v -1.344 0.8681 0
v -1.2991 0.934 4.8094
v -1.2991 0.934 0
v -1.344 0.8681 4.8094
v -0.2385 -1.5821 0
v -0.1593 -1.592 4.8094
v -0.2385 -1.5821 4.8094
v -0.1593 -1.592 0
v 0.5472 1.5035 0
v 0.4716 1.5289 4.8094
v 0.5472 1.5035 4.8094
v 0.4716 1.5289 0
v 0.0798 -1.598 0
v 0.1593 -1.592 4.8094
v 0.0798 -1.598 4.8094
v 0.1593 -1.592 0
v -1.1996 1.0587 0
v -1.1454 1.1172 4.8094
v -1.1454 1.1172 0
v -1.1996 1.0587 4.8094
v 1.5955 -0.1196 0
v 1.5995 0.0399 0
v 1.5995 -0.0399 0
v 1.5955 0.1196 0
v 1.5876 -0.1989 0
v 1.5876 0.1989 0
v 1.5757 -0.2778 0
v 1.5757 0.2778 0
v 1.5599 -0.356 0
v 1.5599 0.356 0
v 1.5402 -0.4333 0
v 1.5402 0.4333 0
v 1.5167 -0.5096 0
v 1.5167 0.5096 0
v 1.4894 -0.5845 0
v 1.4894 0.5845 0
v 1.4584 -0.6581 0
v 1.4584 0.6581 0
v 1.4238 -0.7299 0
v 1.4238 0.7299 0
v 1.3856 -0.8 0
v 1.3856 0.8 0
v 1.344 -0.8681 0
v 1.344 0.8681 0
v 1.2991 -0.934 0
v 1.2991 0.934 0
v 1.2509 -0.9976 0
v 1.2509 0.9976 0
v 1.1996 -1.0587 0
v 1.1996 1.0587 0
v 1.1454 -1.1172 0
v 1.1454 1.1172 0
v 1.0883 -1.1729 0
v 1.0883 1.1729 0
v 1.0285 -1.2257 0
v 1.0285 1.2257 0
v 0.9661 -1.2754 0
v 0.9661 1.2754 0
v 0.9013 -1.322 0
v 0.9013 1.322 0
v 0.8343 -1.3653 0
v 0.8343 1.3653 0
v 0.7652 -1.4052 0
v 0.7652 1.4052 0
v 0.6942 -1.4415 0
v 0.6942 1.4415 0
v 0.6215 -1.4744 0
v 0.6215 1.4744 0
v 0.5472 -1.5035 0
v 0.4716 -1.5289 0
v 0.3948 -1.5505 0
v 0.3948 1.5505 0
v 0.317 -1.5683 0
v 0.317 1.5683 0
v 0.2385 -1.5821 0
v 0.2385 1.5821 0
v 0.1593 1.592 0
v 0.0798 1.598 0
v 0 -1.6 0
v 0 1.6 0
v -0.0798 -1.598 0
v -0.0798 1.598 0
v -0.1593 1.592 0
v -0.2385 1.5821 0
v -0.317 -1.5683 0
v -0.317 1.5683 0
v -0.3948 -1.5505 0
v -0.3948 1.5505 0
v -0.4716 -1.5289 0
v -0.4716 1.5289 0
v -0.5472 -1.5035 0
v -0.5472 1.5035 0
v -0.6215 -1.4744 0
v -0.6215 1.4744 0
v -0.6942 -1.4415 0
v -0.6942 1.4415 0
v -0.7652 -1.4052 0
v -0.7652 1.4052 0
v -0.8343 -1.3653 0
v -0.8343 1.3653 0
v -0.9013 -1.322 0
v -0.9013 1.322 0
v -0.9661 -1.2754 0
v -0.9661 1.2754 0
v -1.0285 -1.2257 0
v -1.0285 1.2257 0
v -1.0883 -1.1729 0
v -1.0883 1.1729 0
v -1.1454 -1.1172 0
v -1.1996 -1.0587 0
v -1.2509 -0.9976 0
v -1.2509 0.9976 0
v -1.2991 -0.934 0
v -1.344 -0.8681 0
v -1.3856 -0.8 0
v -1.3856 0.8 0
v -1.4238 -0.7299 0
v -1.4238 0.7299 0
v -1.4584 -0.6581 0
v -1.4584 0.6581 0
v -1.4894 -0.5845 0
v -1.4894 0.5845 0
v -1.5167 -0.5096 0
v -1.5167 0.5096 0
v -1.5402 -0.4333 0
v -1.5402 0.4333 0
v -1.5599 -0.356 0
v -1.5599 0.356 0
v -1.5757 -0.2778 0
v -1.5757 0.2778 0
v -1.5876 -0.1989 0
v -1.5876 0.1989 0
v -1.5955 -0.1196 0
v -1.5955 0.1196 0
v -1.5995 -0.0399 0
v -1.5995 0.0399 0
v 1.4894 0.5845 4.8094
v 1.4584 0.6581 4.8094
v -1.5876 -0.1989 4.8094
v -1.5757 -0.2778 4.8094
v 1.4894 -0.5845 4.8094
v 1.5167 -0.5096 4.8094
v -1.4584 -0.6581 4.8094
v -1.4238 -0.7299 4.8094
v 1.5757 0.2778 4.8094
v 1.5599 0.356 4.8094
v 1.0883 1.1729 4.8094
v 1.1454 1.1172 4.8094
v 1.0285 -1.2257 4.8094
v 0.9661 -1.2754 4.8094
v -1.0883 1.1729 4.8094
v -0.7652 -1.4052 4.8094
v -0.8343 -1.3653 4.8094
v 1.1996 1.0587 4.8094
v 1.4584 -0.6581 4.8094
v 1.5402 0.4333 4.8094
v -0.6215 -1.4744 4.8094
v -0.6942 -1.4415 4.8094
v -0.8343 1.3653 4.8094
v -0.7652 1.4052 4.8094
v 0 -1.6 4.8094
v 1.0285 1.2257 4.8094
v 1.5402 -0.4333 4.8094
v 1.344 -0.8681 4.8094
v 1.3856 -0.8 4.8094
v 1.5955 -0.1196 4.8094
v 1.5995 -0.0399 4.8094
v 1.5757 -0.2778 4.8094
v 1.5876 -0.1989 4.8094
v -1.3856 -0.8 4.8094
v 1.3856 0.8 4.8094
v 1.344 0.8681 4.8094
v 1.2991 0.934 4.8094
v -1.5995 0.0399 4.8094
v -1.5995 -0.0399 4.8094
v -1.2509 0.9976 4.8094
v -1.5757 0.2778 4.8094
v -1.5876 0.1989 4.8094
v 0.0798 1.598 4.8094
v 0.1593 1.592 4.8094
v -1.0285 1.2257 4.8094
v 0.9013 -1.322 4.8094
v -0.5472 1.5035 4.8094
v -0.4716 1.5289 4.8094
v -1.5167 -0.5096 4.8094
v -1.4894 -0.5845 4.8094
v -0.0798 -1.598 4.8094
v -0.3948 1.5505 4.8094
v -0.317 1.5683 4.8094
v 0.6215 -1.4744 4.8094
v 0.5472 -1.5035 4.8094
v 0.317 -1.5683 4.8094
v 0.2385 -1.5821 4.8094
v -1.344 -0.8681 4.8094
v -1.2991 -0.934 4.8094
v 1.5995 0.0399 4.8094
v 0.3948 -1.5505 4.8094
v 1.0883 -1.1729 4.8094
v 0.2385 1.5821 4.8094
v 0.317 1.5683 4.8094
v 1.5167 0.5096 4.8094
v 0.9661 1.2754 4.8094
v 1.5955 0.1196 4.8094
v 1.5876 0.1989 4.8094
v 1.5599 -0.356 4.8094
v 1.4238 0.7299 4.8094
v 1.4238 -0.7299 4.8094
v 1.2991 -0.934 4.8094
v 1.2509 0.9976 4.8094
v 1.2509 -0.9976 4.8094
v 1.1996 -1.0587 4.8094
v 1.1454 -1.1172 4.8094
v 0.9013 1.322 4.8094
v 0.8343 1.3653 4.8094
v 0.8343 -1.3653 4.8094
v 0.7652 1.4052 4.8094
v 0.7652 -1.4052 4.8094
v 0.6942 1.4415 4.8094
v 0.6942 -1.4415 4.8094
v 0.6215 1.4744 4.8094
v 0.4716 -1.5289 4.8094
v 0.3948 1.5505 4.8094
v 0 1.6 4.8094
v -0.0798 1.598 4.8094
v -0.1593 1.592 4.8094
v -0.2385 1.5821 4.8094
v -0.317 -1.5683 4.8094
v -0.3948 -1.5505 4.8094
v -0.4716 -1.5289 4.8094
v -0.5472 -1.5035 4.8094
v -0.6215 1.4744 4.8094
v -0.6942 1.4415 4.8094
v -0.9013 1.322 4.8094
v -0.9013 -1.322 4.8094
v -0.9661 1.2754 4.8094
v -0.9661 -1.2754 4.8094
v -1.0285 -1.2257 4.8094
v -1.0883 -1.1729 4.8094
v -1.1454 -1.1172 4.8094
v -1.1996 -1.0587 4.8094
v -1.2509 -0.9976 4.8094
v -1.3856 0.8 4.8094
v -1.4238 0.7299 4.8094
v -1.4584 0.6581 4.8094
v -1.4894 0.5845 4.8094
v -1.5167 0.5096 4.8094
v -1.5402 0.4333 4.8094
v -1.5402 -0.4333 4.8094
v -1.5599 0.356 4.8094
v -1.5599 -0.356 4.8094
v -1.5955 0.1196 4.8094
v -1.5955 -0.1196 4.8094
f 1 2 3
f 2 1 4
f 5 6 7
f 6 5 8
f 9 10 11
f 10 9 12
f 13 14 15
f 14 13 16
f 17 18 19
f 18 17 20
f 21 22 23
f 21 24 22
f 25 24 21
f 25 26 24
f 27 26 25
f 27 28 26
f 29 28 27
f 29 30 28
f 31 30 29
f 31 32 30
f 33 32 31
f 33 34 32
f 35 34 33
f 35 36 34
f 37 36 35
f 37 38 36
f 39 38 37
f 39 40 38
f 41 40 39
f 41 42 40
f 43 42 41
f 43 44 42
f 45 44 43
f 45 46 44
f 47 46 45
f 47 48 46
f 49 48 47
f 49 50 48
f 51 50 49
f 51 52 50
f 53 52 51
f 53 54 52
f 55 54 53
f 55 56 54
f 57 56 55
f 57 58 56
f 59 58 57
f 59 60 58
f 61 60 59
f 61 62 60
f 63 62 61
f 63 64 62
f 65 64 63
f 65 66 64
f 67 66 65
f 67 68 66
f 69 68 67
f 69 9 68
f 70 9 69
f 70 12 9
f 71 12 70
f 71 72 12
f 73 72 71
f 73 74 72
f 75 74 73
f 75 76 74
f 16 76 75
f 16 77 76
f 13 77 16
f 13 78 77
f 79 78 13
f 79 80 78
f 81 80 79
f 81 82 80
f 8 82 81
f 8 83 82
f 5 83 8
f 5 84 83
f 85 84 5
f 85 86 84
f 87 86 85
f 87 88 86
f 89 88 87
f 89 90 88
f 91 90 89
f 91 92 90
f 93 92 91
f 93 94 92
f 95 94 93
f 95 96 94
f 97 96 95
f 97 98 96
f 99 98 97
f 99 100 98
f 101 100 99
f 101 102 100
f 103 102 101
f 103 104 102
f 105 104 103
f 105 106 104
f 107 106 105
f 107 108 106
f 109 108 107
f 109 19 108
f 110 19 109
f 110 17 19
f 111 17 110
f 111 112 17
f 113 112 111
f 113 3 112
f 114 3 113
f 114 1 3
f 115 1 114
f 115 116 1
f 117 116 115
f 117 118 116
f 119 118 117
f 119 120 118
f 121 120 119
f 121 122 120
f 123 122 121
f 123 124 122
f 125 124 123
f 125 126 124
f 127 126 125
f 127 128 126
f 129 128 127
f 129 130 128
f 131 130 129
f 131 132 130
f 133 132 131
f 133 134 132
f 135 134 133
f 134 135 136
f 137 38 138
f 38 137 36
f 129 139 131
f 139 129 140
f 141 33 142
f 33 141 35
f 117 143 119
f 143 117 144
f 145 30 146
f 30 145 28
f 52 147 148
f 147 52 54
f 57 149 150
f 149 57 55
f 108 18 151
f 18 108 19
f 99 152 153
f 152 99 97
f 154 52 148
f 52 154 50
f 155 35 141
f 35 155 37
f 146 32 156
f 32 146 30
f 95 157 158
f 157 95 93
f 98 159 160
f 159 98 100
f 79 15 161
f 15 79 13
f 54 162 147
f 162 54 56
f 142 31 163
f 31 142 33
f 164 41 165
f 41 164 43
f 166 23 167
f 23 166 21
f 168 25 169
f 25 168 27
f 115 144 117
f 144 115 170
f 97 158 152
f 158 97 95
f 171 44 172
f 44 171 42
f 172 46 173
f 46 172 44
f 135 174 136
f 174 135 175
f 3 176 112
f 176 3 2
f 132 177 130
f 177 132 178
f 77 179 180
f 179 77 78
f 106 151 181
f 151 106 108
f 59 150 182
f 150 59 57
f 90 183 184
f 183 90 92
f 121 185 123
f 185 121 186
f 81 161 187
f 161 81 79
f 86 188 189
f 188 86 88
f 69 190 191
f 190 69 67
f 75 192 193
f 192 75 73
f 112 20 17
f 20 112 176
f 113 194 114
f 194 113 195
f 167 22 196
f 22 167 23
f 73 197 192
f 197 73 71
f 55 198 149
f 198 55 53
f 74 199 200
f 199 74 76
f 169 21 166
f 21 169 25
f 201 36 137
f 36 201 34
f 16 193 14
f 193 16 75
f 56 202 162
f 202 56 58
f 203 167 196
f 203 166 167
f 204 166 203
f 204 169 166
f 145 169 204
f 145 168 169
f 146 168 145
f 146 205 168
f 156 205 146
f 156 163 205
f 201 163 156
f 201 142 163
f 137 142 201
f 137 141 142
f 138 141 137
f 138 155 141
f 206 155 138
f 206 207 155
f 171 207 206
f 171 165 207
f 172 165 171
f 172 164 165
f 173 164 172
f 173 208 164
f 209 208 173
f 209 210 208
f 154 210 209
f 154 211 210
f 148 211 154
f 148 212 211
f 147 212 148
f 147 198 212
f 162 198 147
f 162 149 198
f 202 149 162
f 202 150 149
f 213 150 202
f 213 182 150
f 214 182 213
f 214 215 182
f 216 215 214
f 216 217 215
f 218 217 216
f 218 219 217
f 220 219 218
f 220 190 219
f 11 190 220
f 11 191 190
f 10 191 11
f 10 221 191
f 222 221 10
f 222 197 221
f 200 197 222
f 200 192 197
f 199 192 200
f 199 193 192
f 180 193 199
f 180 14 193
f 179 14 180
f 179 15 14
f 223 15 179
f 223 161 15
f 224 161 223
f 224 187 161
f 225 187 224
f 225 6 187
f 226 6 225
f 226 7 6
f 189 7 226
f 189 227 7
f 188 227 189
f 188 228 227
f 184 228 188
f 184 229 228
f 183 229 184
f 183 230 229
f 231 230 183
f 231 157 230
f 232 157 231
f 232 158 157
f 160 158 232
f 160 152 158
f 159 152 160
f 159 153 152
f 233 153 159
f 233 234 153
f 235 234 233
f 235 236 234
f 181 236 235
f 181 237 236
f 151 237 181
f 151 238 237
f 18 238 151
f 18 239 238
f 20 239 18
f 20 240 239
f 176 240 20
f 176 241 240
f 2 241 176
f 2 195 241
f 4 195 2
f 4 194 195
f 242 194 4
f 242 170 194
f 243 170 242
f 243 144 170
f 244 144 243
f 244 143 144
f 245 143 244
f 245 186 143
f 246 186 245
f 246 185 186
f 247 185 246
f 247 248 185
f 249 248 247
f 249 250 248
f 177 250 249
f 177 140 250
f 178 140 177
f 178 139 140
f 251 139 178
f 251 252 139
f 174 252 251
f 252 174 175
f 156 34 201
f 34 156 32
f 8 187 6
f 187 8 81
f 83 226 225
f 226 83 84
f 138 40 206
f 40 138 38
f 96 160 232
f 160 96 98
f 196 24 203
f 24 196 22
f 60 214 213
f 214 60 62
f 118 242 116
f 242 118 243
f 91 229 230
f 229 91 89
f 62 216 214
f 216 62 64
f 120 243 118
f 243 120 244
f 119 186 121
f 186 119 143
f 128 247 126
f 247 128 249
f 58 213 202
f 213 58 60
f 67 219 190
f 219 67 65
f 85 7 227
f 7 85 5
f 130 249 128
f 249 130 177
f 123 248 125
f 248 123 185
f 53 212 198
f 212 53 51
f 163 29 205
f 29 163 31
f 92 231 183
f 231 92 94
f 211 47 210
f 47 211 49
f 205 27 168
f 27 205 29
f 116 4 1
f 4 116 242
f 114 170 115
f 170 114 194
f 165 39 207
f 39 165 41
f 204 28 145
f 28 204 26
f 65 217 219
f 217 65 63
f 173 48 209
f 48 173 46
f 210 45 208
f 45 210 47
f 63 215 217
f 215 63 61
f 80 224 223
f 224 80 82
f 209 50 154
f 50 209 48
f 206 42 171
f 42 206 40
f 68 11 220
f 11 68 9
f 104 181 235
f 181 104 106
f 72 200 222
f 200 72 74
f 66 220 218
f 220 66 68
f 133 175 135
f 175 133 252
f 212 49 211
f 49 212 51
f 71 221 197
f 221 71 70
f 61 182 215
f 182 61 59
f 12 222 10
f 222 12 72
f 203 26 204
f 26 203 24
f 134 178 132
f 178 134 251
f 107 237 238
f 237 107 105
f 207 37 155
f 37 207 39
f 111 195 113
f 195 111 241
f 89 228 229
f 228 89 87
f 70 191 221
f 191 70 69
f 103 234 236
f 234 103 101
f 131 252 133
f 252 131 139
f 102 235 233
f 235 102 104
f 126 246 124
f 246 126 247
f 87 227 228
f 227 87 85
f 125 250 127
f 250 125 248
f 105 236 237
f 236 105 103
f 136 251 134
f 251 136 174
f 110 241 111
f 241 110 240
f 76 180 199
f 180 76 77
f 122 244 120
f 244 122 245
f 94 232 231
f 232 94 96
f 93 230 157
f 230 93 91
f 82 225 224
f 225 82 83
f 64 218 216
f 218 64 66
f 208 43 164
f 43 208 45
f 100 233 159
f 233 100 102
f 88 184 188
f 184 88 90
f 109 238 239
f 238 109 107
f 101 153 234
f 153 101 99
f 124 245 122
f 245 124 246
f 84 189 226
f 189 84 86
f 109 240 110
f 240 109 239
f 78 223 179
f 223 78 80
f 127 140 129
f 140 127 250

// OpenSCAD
// file: ../p/stud.scad
use <../lib.scad>
use <4-4cyli.scad>
use <4-4disc.scad>
use <4-4edge.scad>
$fa=1; $fs=0.2;
function ldraw_lib__stud(realsolid=false) = realsolid ? 
    [openscad(translate([0,0,-eps()], o=cylinder(4+eps(), r=6)),2)] : [
// 0 Stud
// 0 Name: stud.dat
// 0 Author: James Jessiman
// 0 !LDRAW_ORG Primitive UPDATE 2012-01
// 0 !LICENSE Licensed under CC BY 2.0 and CC BY 4.0 : see CAreadme.txt
// 
// 0 BFC CERTIFY CCW
  [0,"BFC","CERTIFY"],
  [0,"BFC","CCW"],
// 
// 0 !HISTORY 2002-04-04 [sbliss] Modified for BFC compliance
// 0 !HISTORY 2002-04-25 [PTadmin] Official Update 2002-02
// 0 !HISTORY 2007-06-24 [PTadmin] Header formatted for Contributor Agreement
// 0 !HISTORY 2008-07-01 [PTadmin] Official Update 2008-01
// 0 !HISTORY 2012-02-16 [Philo] Changed to CCW
// 0 !HISTORY 2012-03-30 [PTadmin] Official Update 2012-01
// 
// 
// 1 16 0 0 0 6 0 0 0 1 0 0 0 6 4-4edge.dat
  [1,16,0,0,0,6,0,0,0,1,0,0,0,6, ldraw_lib__4_4edge(realsolid)],
// 1 16 0 -4 0 6 0 0 0 1 0 0 0 6 4-4edge.dat
  [1,16,0,-4,0,6,0,0,0,1,0,0,0,6, ldraw_lib__4_4edge(realsolid)],
// 1 16 0 0 0 6 0 0 0 -4 0 0 0 6 4-4cyli.dat
  [1,16,0,0,0,6,0,0,0,-4,0,0,0,6, ldraw_lib__4_4cyli(realsolid)],
// 1 16 0 -4 0 6 0 0 0 1 0 0 0 6 4-4disc.dat
  [1,16,0,-4,0,6,0,0,0,1,0,0,0,6, ldraw_lib__4_4disc(realsolid)],
];
module ldraw_lib__stud(step=0, col=false, unit=2/5, alt=false, line=0.2, solid=!$preview)
    makepoly(ldraw_lib__stud(solid), step=step, col=col, unit=unit, alt=alt, line=line, solid=solid);
ldraw_lib__stud(line=0.2);
// file: ../p/box4t.scad
use <../lib.scad>
$fa=1; $fs=0.2;
function ldraw_lib__box4t(realsolid=false) = [
// 0 Box with 4 Adjacent Faces and All Edges
// 0 Name: box4t.dat
// 0 Author: Tore Eriksson [Tore_Eriksson]
// 0 !LDRAW_ORG Primitive UPDATE 2003-02
// 0 !LICENSE Licensed under CC BY 2.0 and CC BY 4.0 : see CAreadme.txt
// 
// 0 BFC CERTIFY CCW
  [0,"BFC","CERTIFY"],
  [0,"BFC","CCW"],
// 
// 0 !HISTORY 1997-09-29 [PTadmin] Official Update 1997-15
// 0 !HISTORY 2002-08-31 [izanette] Modified with WINDZ for BFC compliance
// 0 !HISTORY 2003-08-01 [PTadmin] Official Update 2003-02
// 0 !HISTORY 2007-06-24 [PTadmin] Header formatted for Contributor Agreement
// 0 !HISTORY 2008-07-01 [PTadmin] Official Update 2008-01
// 
// 
// 2 24 1 1 1 -1 1 1
  [2,24,1,1,1,-1,1,1],
// 2 24 -1 1 1 -1 1 -1
  [2,24,-1,1,1,-1,1,-1],
// 2 24 -1 1 -1 1 1 -1
  [2,24,-1,1,-1,1,1,-1],
// 2 24 1 1 -1 1 1 1
  [2,24,1,1,-1,1,1,1],
// 2 24 1 0 1 -1 0 1
  [2,24,1,0,1,-1,0,1],
// 2 24 -1 0 1 -1 0 -1
  [2,24,-1,0,1,-1,0,-1],
// 2 24 -1 0 -1 1 0 -1
  [2,24,-1,0,-1,1,0,-1],
// 2 24 1 0 -1 1 0 1
  [2,24,1,0,-1,1,0,1],
// 2 24 1 0 1 1 1 1
  [2,24,1,0,1,1,1,1],
// 2 24 -1 0 1 -1 1 1
  [2,24,-1,0,1,-1,1,1],
// 2 24 1 0 -1 1 1 -1
  [2,24,1,0,-1,1,1,-1],
// 2 24 -1 0 -1 -1 1 -1
  [2,24,-1,0,-1,-1,1,-1],
// 4 16 1 1 1 1 1 -1 -1 1 -1 -1 1 1
  [4,16,1,1,1,1,1,-1,-1,1,-1,-1,1,1],
// 4 16 1 1 1 -1 1 1 -1 0 1 1 0 1
  [4,16,1,1,1,-1,1,1,-1,0,1,1,0,1],
// 4 16 -1 1 1 -1 1 -1 -1 0 -1 -1 0 1
  [4,16,-1,1,1,-1,1,-1,-1,0,-1,-1,0,1],
// 0 4 16 -1 1 -1 -1 0 -1 1 0 -1 1 1 -1
// 4 16 1 1 -1 1 1 1 1 0 1 1 0 -1
  [4,16,1,1,-1,1,1,1,1,0,1,1,0,-1],
// 0
];
module ldraw_lib__box4t(step=0, col=false, unit=2/5, alt=false, line=0.2, solid=!$preview)
    makepoly(ldraw_lib__box4t(solid), step=step, col=col, unit=unit, alt=alt, line=line, solid=solid);
ldraw_lib__box4t(line=0.2);
// file: ../p/4-4edge.scad
use <../lib.scad>
$fa=1; $fs=0.2;
function ldraw_lib__4_4edge(realsolid=false) = [
// 0 Circle 1.0
// 0 Name: 4-4edge.dat
// 0 Author: James Jessiman
// 0 !LDRAW_ORG Primitive UPDATE 2017-01
// 0 !LICENSE Licensed under CC BY 2.0 and CC BY 4.0 : see CAreadme.txt
// 
// 0 BFC CERTIFY CCW
  [0,"BFC","CERTIFY"],
  [0,"BFC","CCW"],
// 
// 0 !HISTORY 1998-12-15 [PTadmin] Official Update 1998-10
// 0 !HISTORY 2005-12-28 [PTadmin] Official Update 2005-01
// 0 !HISTORY 2007-06-24 [PTadmin] Header formatted for Contributor Agreement
// 0 !HISTORY 2008-07-01 [PTadmin] Official Update 2008-01
// 0 !HISTORY 2017-01-15 [Steffen] BFCed
// 0 !HISTORY 2017-12-30 [PTadmin] Official Update 2017-01
// 
// 
// 2 24 1 0 0 0.9239 0 0.3827
  [2,24,1,0,0,0.9239,0,0.3827],
// 2 24 0.9239 0 0.3827 0.7071 0 0.7071
  [2,24,0.9239,0,0.3827,0.7071,0,0.7071],
// 2 24 0.7071 0 0.7071 0.3827 0 0.9239
  [2,24,0.7071,0,0.7071,0.3827,0,0.9239],
// 2 24 0.3827 0 0.9239 0 0 1
  [2,24,0.3827,0,0.9239,0,0,1],
// 2 24 0 0 1 -0.3827 0 0.9239
  [2,24,0,0,1,-0.3827,0,0.9239],
// 2 24 -0.3827 0 0.9239 -0.7071 0 0.7071
  [2,24,-0.3827,0,0.9239,-0.7071,0,0.7071],
// 2 24 -0.7071 0 0.7071 -0.9239 0 0.3827
  [2,24,-0.7071,0,0.7071,-0.9239,0,0.3827],
// 2 24 -0.9239 0 0.3827 -1 0 -0
  [2,24,-0.9239,0,0.3827,-1,0,-0],
// 2 24 -1 0 -0 -0.9239 0 -0.3827
  [2,24,-1,0,-0,-0.9239,0,-0.3827],
// 2 24 -0.9239 0 -0.3827 -0.7071 0 -0.7071
  [2,24,-0.9239,0,-0.3827,-0.7071,0,-0.7071],
// 2 24 -0.7071 0 -0.7071 -0.3827 0 -0.9239
  [2,24,-0.7071,0,-0.7071,-0.3827,0,-0.9239],
// 2 24 -0.3827 0 -0.9239 0 0 -1
  [2,24,-0.3827,0,-0.9239,0,0,-1],
// 2 24 0 0 -1 0.3827 0 -0.9239
  [2,24,0,0,-1,0.3827,0,-0.9239],
// 2 24 0.3827 0 -0.9239 0.7071 0 -0.7071
  [2,24,0.3827,0,-0.9239,0.7071,0,-0.7071],
// 2 24 0.7071 0 -0.7071 0.9239 0 -0.3827
  [2,24,0.7071,0,-0.7071,0.9239,0,-0.3827],
// 2 24 0.9239 0 -0.3827 1 0 0
  [2,24,0.9239,0,-0.3827,1,0,0],
];
module ldraw_lib__4_4edge(step=0, col=false, unit=2/5, alt=false, line=0.2, solid=!$preview)
    makepoly(ldraw_lib__4_4edge(solid), step=step, col=col, unit=unit, alt=alt, line=line, solid=solid);
ldraw_lib__4_4edge(line=0.2);
// file: ../p/4-4disc.scad
use <../lib.scad>
$fa=1; $fs=0.2;
function ldraw_lib__4_4disc(realsolid=false) = [
// 0 Disc 1.0
// 0 Name: 4-4disc.dat
// 0 Author: James Jessiman
// 0 !LDRAW_ORG Primitive UPDATE 2002-02
// 0 !LICENSE Licensed under CC BY 2.0 and CC BY 4.0 : see CAreadme.txt
// 
// 0 BFC CERTIFY CCW
  [0,"BFC","CERTIFY"],
  [0,"BFC","CCW"],
// 
// 0 !HISTORY 1998-12-15 [PTadmin] Official Update 1998-10
// 0 !HISTORY 2002-03-23 [sbliss] Added BFC statement
// 0 !HISTORY 2002-04-25 [PTadmin] Official Update 2002-02
// 0 !HISTORY 2007-06-24 [PTadmin] Header formatted for Contributor Agreement
// 0 !HISTORY 2008-07-01 [PTadmin] Official Update 2008-01
// 
// 
// 3 16 0 0 0 1 0 0 0.9239 0 0.3827
  [3,16,0,0,0,1,0,0,0.9239,0,0.3827],
// 3 16 0 0 0 0.9239 0 0.3827 0.7071 0 0.7071
  [3,16,0,0,0,0.9239,0,0.3827,0.7071,0,0.7071],
// 3 16 0 0 0 0.7071 0 0.7071 0.3827 0 0.9239
  [3,16,0,0,0,0.7071,0,0.7071,0.3827,0,0.9239],
// 3 16 0 0 0 0.3827 0 0.9239 0 0 1
  [3,16,0,0,0,0.3827,0,0.9239,0,0,1],
// 3 16 0 0 0 0 0 1 -0.3827 0 0.9239
  [3,16,0,0,0,0,0,1,-0.3827,0,0.9239],
// 3 16 0 0 0 -0.3827 0 0.9239 -0.7071 0 0.7071
  [3,16,0,0,0,-0.3827,0,0.9239,-0.7071,0,0.7071],
// 3 16 0 0 0 -0.7071 0 0.7071 -0.9239 0 0.3827
  [3,16,0,0,0,-0.7071,0,0.7071,-0.9239,0,0.3827],
// 3 16 0 0 0 -0.9239 0 0.3827 -1 0 -0
  [3,16,0,0,0,-0.9239,0,0.3827,-1,0,-0],
// 3 16 0 0 0 -1 0 -0 -0.9239 0 -0.3827
  [3,16,0,0,0,-1,0,-0,-0.9239,0,-0.3827],
// 3 16 0 0 0 -0.9239 0 -0.3827 -0.7071 0 -0.7071
  [3,16,0,0,0,-0.9239,0,-0.3827,-0.7071,0,-0.7071],
// 3 16 0 0 0 -0.7071 0 -0.7071 -0.3827 0 -0.9239
  [3,16,0,0,0,-0.7071,0,-0.7071,-0.3827,0,-0.9239],
// 3 16 0 0 0 -0.3827 0 -0.9239 0 0 -1
  [3,16,0,0,0,-0.3827,0,-0.9239,0,0,-1],
// 3 16 0 0 0 0 0 -1 0.3827 0 -0.9239
  [3,16,0,0,0,0,0,-1,0.3827,0,-0.9239],
// 3 16 0 0 0 0.3827 0 -0.9239 0.7071 0 -0.7071
  [3,16,0,0,0,0.3827,0,-0.9239,0.7071,0,-0.7071],
// 3 16 0 0 0 0.7071 0 -0.7071 0.9239 0 -0.3827
  [3,16,0,0,0,0.7071,0,-0.7071,0.9239,0,-0.3827],
// 3 16 0 0 0 0.9239 0 -0.3827 1 0 0
  [3,16,0,0,0,0.9239,0,-0.3827,1,0,0],
// 0
];
module ldraw_lib__4_4disc(step=0, col=false, unit=2/5, alt=false, line=0.2, solid=!$preview)
    makepoly(ldraw_lib__4_4disc(solid), step=step, col=col, unit=unit, alt=alt, line=line, solid=solid);
ldraw_lib__4_4disc(line=0.2);
// file: ../p/4-4cyli.scad
use <../lib.scad>
$fa=1; $fs=0.2;
function ldraw_lib__4_4cyli(realsolid=false) = [
// 0 Cylinder 1.0
// 0 Name: 4-4cyli.dat
// 0 Author: James Jessiman
// 0 !LDRAW_ORG Primitive UPDATE 2005-01
// 0 !LICENSE Licensed under CC BY 2.0 and CC BY 4.0 : see CAreadme.txt
// 
// 0 BFC CERTIFY CCW
  [0,"BFC","CERTIFY"],
  [0,"BFC","CCW"],
// 
// 0 !HISTORY 1998-12-15 [PTadmin] Official Update 1998-10
// 0 !HISTORY 2002-03-23 [sbliss] Added BFC statement; merged headers from files in distributions LDraw 0.27 and Complete.
// 0 !HISTORY 2002-04-25 [PTadmin] Official Update 2002-02
// 0 !HISTORY 2004-12-14 [guyvivan] BFC CCW
// 0 !HISTORY 2005-12-28 [PTadmin] Official Update 2005-01
// 0 !HISTORY 2007-06-24 [PTadmin] Header formatted for Contributor Agreement
// 0 !HISTORY 2008-07-01 [PTadmin] Official Update 2008-01
// 
// 
// 4 16 1 1 0 0.9239 1 0.3827 0.9239 0 0.3827 1 0 0
  [4,16,1,1,0,0.9239,1,0.3827,0.9239,0,0.3827,1,0,0],
// 5 24 1 0 0 1 1 0 0.9239 0 0.3827 0.9239 0 -0.3827
  [5,24,1,0,0,1,1,0,0.9239,0,0.3827,0.9239,0,-0.3827],
// 4 16 0.9239 1 0.3827 0.7071 1 0.7071 0.7071 0 0.7071 0.9239 0 0.3827
  [4,16,0.9239,1,0.3827,0.7071,1,0.7071,0.7071,0,0.7071,0.9239,0,0.3827],
// 5 24 0.9239 0 0.3827 0.9239 1 0.3827 0.7071 0 0.7071 1 0 0
  [5,24,0.9239,0,0.3827,0.9239,1,0.3827,0.7071,0,0.7071,1,0,0],
// 4 16 0.7071 1 0.7071 0.3827 1 0.9239 0.3827 0 0.9239 0.7071 0 0.7071
  [4,16,0.7071,1,0.7071,0.3827,1,0.9239,0.3827,0,0.9239,0.7071,0,0.7071],
// 5 24 0.7071 0 0.7071 0.7071 1 0.7071 0.3827 0 0.9239 0.9239 0 0.3827
  [5,24,0.7071,0,0.7071,0.7071,1,0.7071,0.3827,0,0.9239,0.9239,0,0.3827],
// 4 16 0.3827 1 0.9239 0 1 1 0 0 1 0.3827 0 0.9239
  [4,16,0.3827,1,0.9239,0,1,1,0,0,1,0.3827,0,0.9239],
// 5 24 0.3827 0 0.9239 0.3827 1 0.9239 0 0 1 0.7071 0 0.7071
  [5,24,0.3827,0,0.9239,0.3827,1,0.9239,0,0,1,0.7071,0,0.7071],
// 4 16 0 1 1 -0.3827 1 0.9239 -0.3827 0 0.9239 0 0 1
  [4,16,0,1,1,-0.3827,1,0.9239,-0.3827,0,0.9239,0,0,1],
// 5 24 0 0 1 0 1 1 -0.3827 0 0.9239 0.3827 0 0.9239
  [5,24,0,0,1,0,1,1,-0.3827,0,0.9239,0.3827,0,0.9239],
// 4 16 -0.3827 1 0.9239 -0.7071 1 0.7071 -0.7071 0 0.7071 -0.3827 0 0.9239
  [4,16,-0.3827,1,0.9239,-0.7071,1,0.7071,-0.7071,0,0.7071,-0.3827,0,0.9239],
// 5 24 -0.3827 0 0.9239 -0.3827 1 0.9239 -0.7071 0 0.7071 0 0 1
  [5,24,-0.3827,0,0.9239,-0.3827,1,0.9239,-0.7071,0,0.7071,0,0,1],
// 4 16 -0.7071 1 0.7071 -0.9239 1 0.3827 -0.9239 0 0.3827 -0.7071 0 0.7071
  [4,16,-0.7071,1,0.7071,-0.9239,1,0.3827,-0.9239,0,0.3827,-0.7071,0,0.7071],
// 5 24 -0.7071 0 0.7071 -0.7071 1 0.7071 -0.9239 0 0.3827 -0.3827 0 0.9239
  [5,24,-0.7071,0,0.7071,-0.7071,1,0.7071,-0.9239,0,0.3827,-0.3827,0,0.9239],
// 4 16 -0.9239 1 0.3827 -1 1 0 -1 0 0 -0.9239 0 0.3827
  [4,16,-0.9239,1,0.3827,-1,1,0,-1,0,0,-0.9239,0,0.3827],
// 5 24 -0.9239 0 0.3827 -0.9239 1 0.3827 -1 0 0 -0.7071 0 0.7071
  [5,24,-0.9239,0,0.3827,-0.9239,1,0.3827,-1,0,0,-0.7071,0,0.7071],
// 4 16 -1 1 0 -0.9239 1 -0.3827 -0.9239 0 -0.3827 -1 0 0
  [4,16,-1,1,0,-0.9239,1,-0.3827,-0.9239,0,-0.3827,-1,0,0],
// 5 24 -1 0 0 -1 1 0 -0.9239 0 -0.3827 -0.9239 0 0.3827
  [5,24,-1,0,0,-1,1,0,-0.9239,0,-0.3827,-0.9239,0,0.3827],
// 4 16 -0.9239 1 -0.3827 -0.7071 1 -0.7071 -0.7071 0 -0.7071 -0.9239 0 -0.3827
  [4,16,-0.9239,1,-0.3827,-0.7071,1,-0.7071,-0.7071,0,-0.7071,-0.9239,0,-0.3827],
// 5 24 -0.9239 0 -0.3827 -0.9239 1 -0.3827 -0.7071 0 -0.7071 -1 0 0
  [5,24,-0.9239,0,-0.3827,-0.9239,1,-0.3827,-0.7071,0,-0.7071,-1,0,0],
// 4 16 -0.7071 1 -0.7071 -0.3827 1 -0.9239 -0.3827 0 -0.9239 -0.7071 0 -0.7071
  [4,16,-0.7071,1,-0.7071,-0.3827,1,-0.9239,-0.3827,0,-0.9239,-0.7071,0,-0.7071],
// 5 24 -0.7071 0 -0.7071 -0.7071 1 -0.7071 -0.3827 0 -0.9239 -0.9239 0 -0.3827
  [5,24,-0.7071,0,-0.7071,-0.7071,1,-0.7071,-0.3827,0,-0.9239,-0.9239,0,-0.3827],
// 4 16 -0.3827 1 -0.9239 0 1 -1 0 0 -1 -0.3827 0 -0.9239
  [4,16,-0.3827,1,-0.9239,0,1,-1,0,0,-1,-0.3827,0,-0.9239],
// 5 24 -0.3827 0 -0.9239 -0.3827 1 -0.9239 0 0 -1 -0.7071 0 -0.7071
  [5,24,-0.3827,0,-0.9239,-0.3827,1,-0.9239,0,0,-1,-0.7071,0,-0.7071],
// 4 16 0 1 -1 0.3827 1 -0.9239 0.3827 0 -0.9239 0 0 -1
  [4,16,0,1,-1,0.3827,1,-0.9239,0.3827,0,-0.9239,0,0,-1],
// 5 24 0 0 -1 0 1 -1 0.3827 0 -0.9239 -0.3827 0 -0.9239
  [5,24,0,0,-1,0,1,-1,0.3827,0,-0.9239,-0.3827,0,-0.9239],
// 4 16 0.3827 1 -0.9239 0.7071 1 -0.7071 0.7071 0 -0.7071 0.3827 0 -0.9239
  [4,16,0.3827,1,-0.9239,0.7071,1,-0.7071,0.7071,0,-0.7071,0.3827,0,-0.9239],
// 5 24 0.3827 0 -0.9239 0.3827 1 -0.9239 0.7071 0 -0.7071 0 0 -1
  [5,24,0.3827,0,-0.9239,0.3827,1,-0.9239,0.7071,0,-0.7071,0,0,-1],
// 4 16 0.7071 1 -0.7071 0.9239 1 -0.3827 0.9239 0 -0.3827 0.7071 0 -0.7071
  [4,16,0.7071,1,-0.7071,0.9239,1,-0.3827,0.9239,0,-0.3827,0.7071,0,-0.7071],
// 5 24 0.7071 0 -0.7071 0.7071 1 -0.7071 0.9239 0 -0.3827 0.3827 0 -0.9239
  [5,24,0.7071,0,-0.7071,0.7071,1,-0.7071,0.9239,0,-0.3827,0.3827,0,-0.9239],
// 4 16 0.9239 1 -0.3827 1 1 0 1 0 0 0.9239 0 -0.3827
  [4,16,0.9239,1,-0.3827,1,1,0,1,0,0,0.9239,0,-0.3827],
// 5 24 0.9239 0 -0.3827 0.9239 1 -0.3827 1 0 0 0.7071 0 -0.7071
  [5,24,0.9239,0,-0.3827,0.9239,1,-0.3827,1,0,0,0.7071,0,-0.7071],
// 0
];
module ldraw_lib__4_4cyli(step=0, col=false, unit=2/5, alt=false, line=0.2, solid=!$preview)
    makepoly(ldraw_lib__4_4cyli(solid), step=step, col=col, unit=unit, alt=alt, line=line, solid=solid);
ldraw_lib__4_4cyli(line=0.2);
// file: s/3004s01.scad
use <../../lib.scad>
use <../../p/box4t.scad>
use <../../p/box5.scad>
use <../../p/stud.scad>
use <../../p/stud3.scad>
$fa=1; $fs=0.2;
function ldraw_lib__s__3004s01(realsolid=false) = [
// 0 ~Brick  1 x  2 without Front Face
// 0 Name: s\3004s01.dat
// 0 Author: James Jessiman
// 0 !LDRAW_ORG Subpart UPDATE 2003-03
// 0 !LICENSE Licensed under CC BY 2.0 and CC BY 4.0 : see CAreadme.txt
// 
// 0 BFC CERTIFY CCW
  [0,"BFC","CERTIFY"],
  [0,"BFC","CCW"],
// 
// 0 !HISTORY 2003-09-07 [jriley] Subfiling, BFC
// 0 !HISTORY 2003-12-19 [PTadmin] Official Update 2003-03
// 0 !HISTORY 2007-08-29 [PTadmin] Header formatted for Contributor Agreement
// 0 !HISTORY 2008-07-01 [PTadmin] Official Update 2008-01
// 
// 
// 1 16 0 4 0 1 0 0 0 -5 0 0 0 1 stud3.dat
  [1,16,0,4,0,1,0,0,0,-5,0,0,0,1, ldraw_lib__stud3(realsolid)],
// 0 BFC INVERTNEXT
  [0,"BFC","INVERTNEXT"],
// 1 16 0 24 0 16 0 0 0 -20 0 0 0 6 box5.dat
  [1,16,0,24,0,16,0,0,0,-20,0,0,0,6, ldraw_lib__box5(realsolid)],
// 4 16 20 24 10 16 24 6 -16 24 6 -20 24 10
  [4,16,20,24,10,16,24,6,-16,24,6,-20,24,10],
// 4 16 -20 24 10 -16 24 6 -16 24 -6 -20 24 -10
  [4,16,-20,24,10,-16,24,6,-16,24,-6,-20,24,-10],
// 4 16 -20 24 -10 -16 24 -6 16 24 -6 20 24 -10
  [4,16,-20,24,-10,-16,24,-6,16,24,-6,20,24,-10],
// 4 16 20 24 -10 16 24 -6 16 24 6 20 24 10
  [4,16,20,24,-10,16,24,-6,16,24,6,20,24,10],
// 1 16 0 24 0 20 0 0 0 -24 0 0 0 10 box4t.dat
  [1,16,0,24,0,20,0,0,0,-24,0,0,0,10, ldraw_lib__box4t(realsolid)],
// 1 16 10 0 0 1 0 0 0 1 0 0 0 1 stud.dat
  [1,16,10,0,0,1,0,0,0,1,0,0,0,1, ldraw_lib__stud(realsolid)],
// 1 16 -10 0 0 1 0 0 0 1 0 0 0 1 stud.dat
  [1,16,-10,0,0,1,0,0,0,1,0,0,0,1, ldraw_lib__stud(realsolid)],
// 0
];
module ldraw_lib__s__3004s01(step=0, col=false, unit=2/5, alt=false, line=0.2, solid=!$preview)
    makepoly(ldraw_lib__s__3004s01(solid), step=step, col=col, unit=unit, alt=alt, line=line, solid=solid);
ldraw_lib__s__3004s01(line=0.2);
// file: ../p/stud3.scad
use <../lib.scad>
use <4-4cyli.scad>
use <4-4disc.scad>
use <4-4edge.scad>
$fa=1; $fs=0.2;
function ldraw_lib__stud3(realsolid=false) = realsolid ? 
    [openscad(translate([0,0,-eps()], o=cylinder(4+eps(), r=4)),2)] : [
// 0 Stud Tube Solid
// 0 Name: stud3.dat
// 0 Author: James Jessiman
// 0 !LDRAW_ORG Primitive UPDATE 2012-01
// 0 !LICENSE Licensed under CC BY 2.0 and CC BY 4.0 : see CAreadme.txt
// 
// 0 BFC CERTIFY CCW
  [0,"BFC","CERTIFY"],
  [0,"BFC","CCW"],
// 
// 0 !HISTORY 2002-04-04 [sbliss] Modified for BFC compliance
// 0 !HISTORY 2002-04-25 [PTadmin] Official Update 2002-02
// 0 !HISTORY 2007-06-24 [PTadmin] Header formatted for Contributor Agreement
// 0 !HISTORY 2008-07-01 [PTadmin] Official Update 2008-01
// 0 !HISTORY 2012-02-16 [Philo] Changed to CCW
// 0 !HISTORY 2012-03-30 [PTadmin] Official Update 2012-01
// 
// 
// 1 16 0 -4 0 4 0 0 0 1 0 0 0 4 4-4edge.dat
  [1,16,0,-4,0,4,0,0,0,1,0,0,0,4, ldraw_lib__4_4edge(realsolid)],
// 1 16 0 0 0 4 0 0 0 1 0 0 0 4 4-4edge.dat
  [1,16,0,0,0,4,0,0,0,1,0,0,0,4, ldraw_lib__4_4edge(realsolid)],
// 1 16 0 -4 0 4 0 0 0 1 0 0 0 4 4-4disc.dat
  [1,16,0,-4,0,4,0,0,0,1,0,0,0,4, ldraw_lib__4_4disc(realsolid)],
// 1 16 0 -4 0 4 0 0 0 4 0 0 0 4 4-4cyli.dat
  [1,16,0,-4,0,4,0,0,0,4,0,0,0,4, ldraw_lib__4_4cyli(realsolid)],
];
module ldraw_lib__stud3(step=0, col=false, unit=2/5, alt=false, line=0.2, solid=!$preview)
    makepoly(ldraw_lib__stud3(solid), step=step, col=col, unit=unit, alt=alt, line=line, solid=solid);
ldraw_lib__stud3(line=0.2);
// file: ../p/box5.scad
use <../lib.scad>
$fa=1; $fs=0.2;
function ldraw_lib__box5(realsolid=false) = [
// 0 Box with 5 Faces and All Edges
// 0 Name: box5.dat
// 0 Author: James Jessiman
// 0 !LDRAW_ORG Primitive UPDATE 2012-01
// 0 !LICENSE Licensed under CC BY 2.0 and CC BY 4.0 : see CAreadme.txt
// 
// 0 BFC CERTIFY CCW
  [0,"BFC","CERTIFY"],
  [0,"BFC","CCW"],
// 
// 0 !HISTORY 2002-04-03 [sbliss] Modified for BFC compliance
// 0 !HISTORY 2002-04-25 [PTadmin] Official Update 2002-02
// 0 !HISTORY 2007-06-24 [PTadmin] Header formatted for Contributor Agreement
// 0 !HISTORY 2008-07-01 [PTadmin] Official Update 2008-01
// 0 !HISTORY 2012-02-16 [Philo] Changed to CCW
// 0 !HISTORY 2012-03-30 [PTadmin] Official Update 2012-01
// 
// 
// 2 24 1 1 1 -1 1 1
  [2,24,1,1,1,-1,1,1],
// 2 24 -1 1 1 -1 1 -1
  [2,24,-1,1,1,-1,1,-1],
// 2 24 -1 1 -1 1 1 -1
  [2,24,-1,1,-1,1,1,-1],
// 2 24 1 1 -1 1 1 1
  [2,24,1,1,-1,1,1,1],
// 2 24 1 0 1 -1 0 1
  [2,24,1,0,1,-1,0,1],
// 2 24 -1 0 1 -1 0 -1
  [2,24,-1,0,1,-1,0,-1],
// 2 24 -1 0 -1 1 0 -1
  [2,24,-1,0,-1,1,0,-1],
// 2 24 1 0 -1 1 0 1
  [2,24,1,0,-1,1,0,1],
// 2 24 1 0 1 1 1 1
  [2,24,1,0,1,1,1,1],
// 2 24 -1 0 1 -1 1 1
  [2,24,-1,0,1,-1,1,1],
// 2 24 1 0 -1 1 1 -1
  [2,24,1,0,-1,1,1,-1],
// 2 24 -1 0 -1 -1 1 -1
  [2,24,-1,0,-1,-1,1,-1],
// 4 16 -1 1 1 1 1 1 1 1 -1 -1 1 -1
  [4,16,-1,1,1,1,1,1,1,1,-1,-1,1,-1],
// 4 16 -1 1 1 -1 0 1 1 0 1 1 1 1
  [4,16,-1,1,1,-1,0,1,1,0,1,1,1,1],
// 4 16 -1 1 -1 -1 0 -1 -1 0 1 -1 1 1
  [4,16,-1,1,-1,-1,0,-1,-1,0,1,-1,1,1],
// 4 16 1 1 -1 1 0 -1 -1 0 -1 -1 1 -1
  [4,16,1,1,-1,1,0,-1,-1,0,-1,-1,1,-1],
// 4 16 1 1 1 1 0 1 1 0 -1 1 1 -1
  [4,16,1,1,1,1,0,1,1,0,-1,1,1,-1],
];
module ldraw_lib__box5(step=0, col=false, unit=2/5, alt=false, line=0.2, solid=!$preview)
    makepoly(ldraw_lib__box5(solid), step=step, col=col, unit=unit, alt=alt, line=line, solid=solid);
ldraw_lib__box5(line=0.2);
// file: ../p/box4-1.scad
use <../lib.scad>
$fa=1; $fs=0.2;
function ldraw_lib__box4_1(realsolid=false) = [
// 0 Box with 4 Faces without 1 Edge
// 0 Name: box4-1.dat
// 0 Author: Tore Eriksson [Tore_Eriksson]
// 0 !LDRAW_ORG Primitive UPDATE 2012-01
// 0 !LICENSE Licensed under CC BY 2.0 and CC BY 4.0 : see CAreadme.txt
// 
// 0 BFC CERTIFY CCW
  [0,"BFC","CERTIFY"],
  [0,"BFC","CCW"],
// 
// 0 !HISTORY 1998-07-15 [PTadmin] Official Update 1998-07
// 0 !HISTORY 2002-04-05 [hafhead] Made BFC compliant
// 0 !HISTORY 2002-04-25 [PTadmin] Official Update 2002-02
// 0 !HISTORY 2007-06-24 [PTadmin] Header formatted for Contributor Agreement
// 0 !HISTORY 2008-07-01 [PTadmin] Official Update 2008-01
// 0 !HISTORY 2012-02-16 [Philo] Changed to CCW
// 0 !HISTORY 2012-03-30 [PTadmin] Official Update 2012-01
// 
// 
// 2 24 1 1 1 -1 1 1
  [2,24,1,1,1,-1,1,1],
// 2 24 -1 1 1 -1 1 -1
  [2,24,-1,1,1,-1,1,-1],
// 2 24 -1 1 -1 1 1 -1
  [2,24,-1,1,-1,1,1,-1],
// 2 24 1 1 -1 1 1 1
  [2,24,1,1,-1,1,1,1],
// 2 24 1 0 1 -1 0 1
  [2,24,1,0,1,-1,0,1],
// 2 24 -1 0 1 -1 0 -1
  [2,24,-1,0,1,-1,0,-1],
// 2 24 1 0 -1 1 0 1
  [2,24,1,0,-1,1,0,1],
// 2 24 1 0 1 1 1 1
  [2,24,1,0,1,1,1,1],
// 2 24 -1 0 1 -1 1 1
  [2,24,-1,0,1,-1,1,1],
// 2 24 1 0 -1 1 1 -1
  [2,24,1,0,-1,1,1,-1],
// 2 24 -1 0 -1 -1 1 -1
  [2,24,-1,0,-1,-1,1,-1],
// 4 16 -1 1 1 1 1 1 1 1 -1 -1 1 -1
  [4,16,-1,1,1,1,1,1,1,1,-1,-1,1,-1],
// 4 16 -1 1 1 -1 0 1 1 0 1 1 1 1
  [4,16,-1,1,1,-1,0,1,1,0,1,1,1,1],
// 4 16 -1 1 -1 -1 0 -1 -1 0 1 -1 1 1
  [4,16,-1,1,-1,-1,0,-1,-1,0,1,-1,1,1],
// 4 16 1 1 1 1 0 1 1 0 -1 1 1 -1
  [4,16,1,1,1,1,0,1,1,0,-1,1,1,-1],
];
module ldraw_lib__box4_1(step=0, col=false, unit=2/5, alt=false, line=0.2, solid=!$preview)
    makepoly(ldraw_lib__box4_1(solid), step=step, col=col, unit=unit, alt=alt, line=line, solid=solid);
ldraw_lib__box4_1(line=0.2);
// file: ../p/box3u2p.scad
use <../lib.scad>
$fa=1; $fs=0.2;
function ldraw_lib__box3u2p(realsolid=false) = [
// 0 Box with 3 Faces without 2 Parallel Edges
// 0 Name: box3u2p.dat
// 0 Author: Niels Karsdorp [nielsk]
// 0 !LDRAW_ORG Primitive UPDATE 2012-01
// 0 !LICENSE Licensed under CC BY 2.0 and CC BY 4.0 : see CAreadme.txt
// 
// 0 BFC CERTIFY CCW
  [0,"BFC","CERTIFY"],
  [0,"BFC","CCW"],
// 
// 0 !HISTORY 2003-03-12 [PTadmin] Official Update 2003-01
// 0 !HISTORY 2007-06-24 [PTadmin] Header formatted for Contributor Agreement
// 0 !HISTORY 2008-07-01 [PTadmin] Official Update 2008-01
// 0 !HISTORY 2012-02-16 [Philo] Changed to CCW
// 0 !HISTORY 2012-03-30 [PTadmin] Official Update 2012-01
// 
// 
// 2 24 1 1 1 -1 1 1
  [2,24,1,1,1,-1,1,1],
// 2 24 -1 1 -1 1 1 -1
  [2,24,-1,1,-1,1,1,-1],
// 2 24 1 0 1 -1 0 1
  [2,24,1,0,1,-1,0,1],
// 2 24 -1 0 -1 1 0 -1
  [2,24,-1,0,-1,1,0,-1],
// 2 24 1 1 1 1 1 -1
  [2,24,1,1,1,1,1,-1],
// 2 24 -1 1 1 -1 1 -1
  [2,24,-1,1,1,-1,1,-1],
// 2 24 1 1 1 1 0 1
  [2,24,1,1,1,1,0,1],
// 2 24 1 1 -1 1 0 -1
  [2,24,1,1,-1,1,0,-1],
// 2 24 -1 1 1 -1 0 1
  [2,24,-1,1,1,-1,0,1],
// 2 24 -1 1 -1 -1 0 -1
  [2,24,-1,1,-1,-1,0,-1],
// 4 16 -1 1 -1 -1 1 1 1 1 1 1 1 -1
  [4,16,-1,1,-1,-1,1,1,1,1,1,1,1,-1],
// 4 16 -1 1 1 -1 0 1 1 0 1 1 1 1
  [4,16,-1,1,1,-1,0,1,1,0,1,1,1,1],
// 4 16 1 1 -1 1 0 -1 -1 0 -1 -1 1 -1
  [4,16,1,1,-1,1,0,-1,-1,0,-1,-1,1,-1],
];
module ldraw_lib__box3u2p(step=0, col=false, unit=2/5, alt=false, line=0.2, solid=!$preview)
    makepoly(ldraw_lib__box3u2p(solid), step=step, col=col, unit=unit, alt=alt, line=line, solid=solid);
ldraw_lib__box3u2p(line=0.2);
// file: 3004.scad
use <../lib.scad>
use <s/3004s01.scad>
$fa=1; $fs=0.2;
function ldraw_lib__3004(realsolid=false) = [
// 0 Brick  1 x  2
// 0 Name: 3004.dat
// 0 Author: James Jessiman
// 0 !LDRAW_ORG Part UPDATE 2022-05
// 0 !LICENSE Licensed under CC BY 2.0 and CC BY 4.0 : see CAreadme.txt
// 
// 0 BFC CERTIFY CCW
  [0,"BFC","CERTIFY"],
  [0,"BFC","CCW"],
// 
// 0 !HISTORY 2001-10-26 [PTadmin] Official Update 2001-01
// 0 !HISTORY 2002-05-07 {unknown} BFC Certification
// 0 !HISTORY 2002-06-11 [PTadmin] Official Update 2002-03
// 0 !HISTORY 2007-05-07 [PTadmin] Header formatted for Contributor Agreement
// 0 !HISTORY 2008-07-01 [PTadmin] Official Update 2008-01
// 0 !HISTORY 2022-08-04 [MagFors] Using subfile
// 0 !HISTORY 2022-09-15 [PTadmin] Official Update 2022-05
// 
// 
// 1 16 0 0 0 1 0 0 0 1 0 0 0 1 s\3004s01.dat
  [1,16,0,0,0,1,0,0,0,1,0,0,0,1, ldraw_lib__s__3004s01(realsolid)],
// 4 16 -20 24 -10 20 24 -10 20 0 -10 -20 0 -10
  [4,16,-20,24,-10,20,24,-10,20,0,-10,-20,0,-10],
];
module ldraw_lib__3004(step=0, col=false, unit=2/5, alt=false, line=0.2, solid=!$preview)
    makepoly(ldraw_lib__3004(solid), step=step, col=col, unit=unit, alt=alt, line=line, solid=solid);
ldraw_lib__3004(line=0.2);
// file: s/20308s01.scad
use <../../lib.scad>
use <../../p/box3u2p.scad>
use <../../p/box4-1.scad>
use <../../p/box5.scad>
use <../../p/stud3.scad>
$fa=1; $fs=0.2;
function ldraw_lib__s__20308s01(realsolid=false) = [
// 0 ~Animal Head Cuboid without Decorated Surfaces
// 0 Name: s\20308s01.dat
// 0 Author: Philippe Hurbain [Philo]
// 0 !LDRAW_ORG Subpart UPDATE 2020-03
// 0 !LICENSE Licensed under CC BY 2.0 and CC BY 4.0 : see CAreadme.txt
// 
// 0 BFC CERTIFY CCW
  [0,"BFC","CERTIFY"],
  [0,"BFC","CCW"],
// 
// 0 !HISTORY 2016-03-18 {LEGO Digital Designer} Original part shape
// 0 !HISTORY 2020-04-16 [Philo] File preparation for LDraw Parts Tracker
// 0 !HISTORY 2020-12-29 [PTadmin] Official Update 2020-03
// 
// 
// 1 16 0 0 0 20 0 0 0 -16 0 0 0 10 box5.dat
  [1,16,0,0,0,20,0,0,0,-16,0,0,0,10, ldraw_lib__box5(realsolid)],
// 0 BFC INVERTNEXT
  [0,"BFC","INVERTNEXT"],
// 1 16 0 0 0 16 0 0 0 -12 0 0 0 6 box5.dat
  [1,16,0,0,0,16,0,0,0,-12,0,0,0,6, ldraw_lib__box5(realsolid)],
// 0 BFC INVERTNEXT
  [0,"BFC","INVERTNEXT"],
// 1 16 0 20 -29.5 3.5 0 0 0 -11 0 0 0 -7.5 box4-1.dat
  [1,16,0,20,-29.5,3.5,0,0,0,-11,0,0,0,-7.5, ldraw_lib__box4_1(realsolid)],
// 1 16 0 20 -18 0 0 16 0 -32.5 0 8 0 0 box3u2p.dat
  [1,16,0,20,-18,0,0,16,0,-32.5,0,8,0,0, ldraw_lib__box3u2p(realsolid)],
// 1 16 0 20 -33.5 0 0 7.5 0 -14.5 0 7.5 0 0 box3u2p.dat
  [1,16,0,20,-33.5,0,0,7.5,0,-14.5,0,7.5,0,0, ldraw_lib__box3u2p(realsolid)],
// 0 BFC INVERTNEXT
  [0,"BFC","INVERTNEXT"],
// 1 16 0 20 -16 0 0 12 0 -28 0 6 0 0 box3u2p.dat
  [1,16,0,20,-16,0,0,12,0,-28,0,6,0,0, ldraw_lib__box3u2p(realsolid)],
// 1 16 11 -12.5 -12 3.7 0 0 0 -7.5 0 0 0 2 box5.dat
  [1,16,11,-12.5,-12,3.7,0,0,0,-7.5,0,0,0,2, ldraw_lib__box5(realsolid)],
// 1 16 -11 -12.5 -12 3.7 0 0 0 -7.5 0 0 0 2 box5.dat
  [1,16,-11,-12.5,-12,3.7,0,0,0,-7.5,0,0,0,2, ldraw_lib__box5(realsolid)],
// 1 16 0 -12 0 1 0 0 0 -3 0 0 0 1 stud3.dat
  [1,16,0,-12,0,1,0,0,0,-3,0,0,0,1, ldraw_lib__stud3(realsolid)],
// 4 16 12 20 -10 12 -8 -10 16 -12.5 -10 16 20 -10
  [4,16,12,20,-10,12,-8,-10,16,-12.5,-10,16,20,-10],
// 4 16 -16 20 -10 -16 -12.5 -10 -12 -8 -10 -12 20 -10
  [4,16,-16,20,-10,-16,-12.5,-10,-12,-8,-10,-12,20,-10],
// 4 16 16 20 -26 12 20 -22 12 20 -10 16 20 -10
  [4,16,16,20,-26,12,20,-22,12,20,-10,16,20,-10],
// 4 16 -12 20 -22 -16 20 -26 -16 20 -10 -12 20 -10
  [4,16,-12,20,-22,-16,20,-26,-16,20,-10,-12,20,-10],
// 2 24 12 20 -10 16 20 -10
  [2,24,12,20,-10,16,20,-10],
// 2 24 -16 20 -10 -12 20 -10
  [2,24,-16,20,-10,-12,20,-10],
// 4 16 16 0 -6 20 0 -10 -20 0 -10 -16 0 -6
  [4,16,16,0,-6,20,0,-10,-20,0,-10,-16,0,-6],
// 4 16 -16 0 -6 -20 0 -10 -20 0 10 -16 0 6
  [4,16,-16,0,-6,-20,0,-10,-20,0,10,-16,0,6],
// 4 16 16 0 6 -16 0 6 -20 0 10 20 0 10
  [4,16,16,0,6,-16,0,6,-20,0,10,20,0,10],
// 4 16 20 0 -10 16 0 -6 16 0 6 20 0 10
  [4,16,20,0,-10,16,0,-6,16,0,6,20,0,10],
// 4 16 -3.5 20 -22 -7.5 20 -26 -16 20 -26 -12 20 -22
  [4,16,-3.5,20,-22,-7.5,20,-26,-16,20,-26,-12,20,-22],
// 4 16 -7.5 20 -41 -7.5 20 -26 -3.5 20 -22 -3.5 20 -37
  [4,16,-7.5,20,-41,-7.5,20,-26,-3.5,20,-22,-3.5,20,-37],
// 4 16 -7.5 20 -41 -3.5 20 -37 3.5 20 -37 7.5 20 -41
  [4,16,-7.5,20,-41,-3.5,20,-37,3.5,20,-37,7.5,20,-41],
// 4 16 7.5 20 -41 3.5 20 -37 3.5 20 -22 7.5 20 -26
  [4,16,7.5,20,-41,3.5,20,-37,3.5,20,-22,7.5,20,-26],
// 4 16 7.5 20 -26 3.5 20 -22 12 20 -22 16 20 -26
  [4,16,7.5,20,-26,3.5,20,-22,12,20,-22,16,20,-26],
// 4 16 12 20 -22 3.5 20 -22 3.5 9 -22 12 -8 -22
  [4,16,12,20,-22,3.5,20,-22,3.5,9,-22,12,-8,-22],
// 4 16 -12 -8 -22 12 -8 -22 3.5 9 -22 -3.5 9 -22
  [4,16,-12,-8,-22,12,-8,-22,3.5,9,-22,-3.5,9,-22],
// 4 16 -12 -8 -22 -3.5 9 -22 -3.5 20 -22 -12 20 -22
  [4,16,-12,-8,-22,-3.5,9,-22,-3.5,20,-22,-12,20,-22],
// 2 24 12 20 -22 3.5 20 -22
  [2,24,12,20,-22,3.5,20,-22],
// 2 24 -3.5 20 -22 -12 20 -22
  [2,24,-3.5,20,-22,-12,20,-22],
// 2 24 -7.5 20 -26 -16 20 -26
  [2,24,-7.5,20,-26,-16,20,-26],
// 2 24 16 20 -26 7.5 20 -26
  [2,24,16,20,-26,7.5,20,-26],
// 2 24 7.5 20 -41 -7.5 20 -41
  [2,24,7.5,20,-41,-7.5,20,-41],
];
module ldraw_lib__s__20308s01(step=0, col=false, unit=2/5, alt=false, line=0.2, solid=!$preview)
    makepoly(ldraw_lib__s__20308s01(solid), step=step, col=col, unit=unit, alt=alt, line=line, solid=solid);
ldraw_lib__s__20308s01(line=0.2);
// main file
use <../lib.scad>
use <s/20308s01.scad>
$fa=1; $fs=0.2;
function ldraw_lib__20308p03(realsolid=false) = [
// 0 Animal Head Cuboid with  2 Squares Black and White Eyes Pattern
// 0 Name: 20308p03.dat
// 0 Author: Philippe Hurbain [Philo]
// 0 !LDRAW_ORG Part UPDATE 2020-03
// 0 !LICENSE Licensed under CC BY 2.0 and CC BY 4.0 : see CAreadme.txt
// 
// 0 BFC CERTIFY CCW
  [0,"BFC","CERTIFY"],
  [0,"BFC","CCW"],
// 
// 0 !KEYWORDS Bricklink 21098pb03, DesignID 67030, Dog, Minecraft, Wolf
// 
// 0 !HISTORY 2016-03-18 {LEGO Digital Designer} Original part shape
// 0 !HISTORY 2020-04-16 [Philo] File preparation for LDraw Parts Tracker
// 0 !HISTORY 2020-12-29 [PTadmin] Official Update 2020-03
// 
// 
// 1 16 0 0 0 1 0 0 0 1 0 0 0 1 s\20308s01.dat
  [1,16,0,0,0,1,0,0,0,1,0,0,0,1, ldraw_lib__s__20308s01(realsolid)],
// 4 0 -9.9 0.5 -26 -5.2 1.1 -26 -5.2 -3.8 -26 -9.9 -3.2 -26
  [4,0,-9.9,0.5,-26,-5.2,1.1,-26,-5.2,-3.8,-26,-9.9,-3.2,-26],
// 4 0 -5.2 1.1 -26 -9.9 0.5 -26 -13.5 0.5 -26 -14.1 1.1 -26
  [4,0,-5.2,1.1,-26,-9.9,0.5,-26,-13.5,0.5,-26,-14.1,1.1,-26],
// 4 0 -14.1 -3.8 -26 -14.1 1.1 -26 -13.5 0.5 -26 -13.5 -3.2 -26
  [4,0,-14.1,-3.8,-26,-14.1,1.1,-26,-13.5,0.5,-26,-13.5,-3.2,-26],
// 4 0 -5.2 -3.8 -26 -14.1 -3.8 -26 -13.5 -3.2 -26 -9.9 -3.2 -26
  [4,0,-5.2,-3.8,-26,-14.1,-3.8,-26,-13.5,-3.2,-26,-9.9,-3.2,-26],
// 4 15 -9.9 -3.2 -26 -13.5 -3.2 -26 -13.5 0.5 -26 -9.9 0.5 -26
  [4,15,-9.9,-3.2,-26,-13.5,-3.2,-26,-13.5,0.5,-26,-9.9,0.5,-26],
// 4 16 -16 -12.5 -26 -14.1 -3.8 -26 -5.2 -3.8 -26 16 -12.5 -26
  [4,16,-16,-12.5,-26,-14.1,-3.8,-26,-5.2,-3.8,-26,16,-12.5,-26],
// 4 16 -14.1 1.1 -26 -14.1 -3.8 -26 -16 -12.5 -26 -16 20 -26
  [4,16,-14.1,1.1,-26,-14.1,-3.8,-26,-16,-12.5,-26,-16,20,-26],
// 4 16 -14.1 1.1 -26 -16 20 -26 -7.5 20 -26 -7.5 5.5 -26
  [4,16,-14.1,1.1,-26,-16,20,-26,-7.5,20,-26,-7.5,5.5,-26],
// 3 16 -5.2 1.1 -26 -14.1 1.1 -26 -7.5 5.5 -26
  [3,16,-5.2,1.1,-26,-14.1,1.1,-26,-7.5,5.5,-26],
// 4 0 5.2 -3.8 -26 5.2 1.1 -26 9.9 0.5 -26 9.9 -3.2 -26
  [4,0,5.2,-3.8,-26,5.2,1.1,-26,9.9,0.5,-26,9.9,-3.2,-26],
// 4 0 13.5 0.5 -26 9.9 0.5 -26 5.2 1.1 -26 14.1 1.1 -26
  [4,0,13.5,0.5,-26,9.9,0.5,-26,5.2,1.1,-26,14.1,1.1,-26],
// 4 0 13.5 0.5 -26 14.1 1.1 -26 14.1 -3.8 -26 13.5 -3.2 -26
  [4,0,13.5,0.5,-26,14.1,1.1,-26,14.1,-3.8,-26,13.5,-3.2,-26],
// 4 0 13.5 -3.2 -26 14.1 -3.8 -26 5.2 -3.8 -26 9.9 -3.2 -26
  [4,0,13.5,-3.2,-26,14.1,-3.8,-26,5.2,-3.8,-26,9.9,-3.2,-26],
// 4 15 13.5 0.5 -26 13.5 -3.2 -26 9.9 -3.2 -26 9.9 0.5 -26
  [4,15,13.5,0.5,-26,13.5,-3.2,-26,9.9,-3.2,-26,9.9,0.5,-26],
// 3 16 16 -12.5 -26 5.2 -3.8 -26 14.1 -3.8 -26
  [3,16,16,-12.5,-26,5.2,-3.8,-26,14.1,-3.8,-26],
// 4 16 16 -12.5 -26 14.1 -3.8 -26 14.1 1.1 -26 16 20 -26
  [4,16,16,-12.5,-26,14.1,-3.8,-26,14.1,1.1,-26,16,20,-26],
// 4 16 7.5 20 -26 16 20 -26 14.1 1.1 -26 7.5 5.5 -26
  [4,16,7.5,20,-26,16,20,-26,14.1,1.1,-26,7.5,5.5,-26],
// 4 16 7.5 5.5 -26 14.1 1.1 -26 5.2 1.1 -26 -7.5 5.5 -26
  [4,16,7.5,5.5,-26,14.1,1.1,-26,5.2,1.1,-26,-7.5,5.5,-26],
// 4 16 5.2 -3.8 -26 16 -12.5 -26 -5.2 -3.8 -26 -5.2 1.1 -26
  [4,16,5.2,-3.8,-26,16,-12.5,-26,-5.2,-3.8,-26,-5.2,1.1,-26],
// 4 16 5.2 1.1 -26 5.2 -3.8 -26 -5.2 1.1 -26 -7.5 5.5 -26
  [4,16,5.2,1.1,-26,5.2,-3.8,-26,-5.2,1.1,-26,-7.5,5.5,-26],
// 4 0 -2.1 7.3 -41 -2.1 11.4 -41 2.1 11.4 -41 2.1 7.3 -41
  [4,0,-2.1,7.3,-41,-2.1,11.4,-41,2.1,11.4,-41,2.1,7.3,-41],
// 4 0 -5.9 15.4 -41 -5.9 19.1 -41 5.9 19.1 -41 5.9 15.4 -41
  [4,0,-5.9,15.4,-41,-5.9,19.1,-41,5.9,19.1,-41,5.9,15.4,-41],
// 4 13 -2.1 11.4 -41 -5.9 15.4 -41 5.9 15.4 -41 2.1 11.4 -41
  [4,13,-2.1,11.4,-41,-5.9,15.4,-41,5.9,15.4,-41,2.1,11.4,-41],
// 4 13 2.1 11.4 -41 5.9 15.4 -41 5.9 7.3 -41 2.1 7.3 -41
  [4,13,2.1,11.4,-41,5.9,15.4,-41,5.9,7.3,-41,2.1,7.3,-41],
// 4 13 -2.1 7.3 -41 -5.9 7.3 -41 -5.9 15.4 -41 -2.1 11.4 -41
  [4,13,-2.1,7.3,-41,-5.9,7.3,-41,-5.9,15.4,-41,-2.1,11.4,-41],
// 4 16 7.5 5.5 -41 -7.5 5.5 -41 -5.9 7.3 -41 -2.1 7.3 -41
  [4,16,7.5,5.5,-41,-7.5,5.5,-41,-5.9,7.3,-41,-2.1,7.3,-41],
// 4 16 7.5 20 -41 7.5 5.5 -41 5.9 7.3 -41 5.9 15.4 -41
  [4,16,7.5,20,-41,7.5,5.5,-41,5.9,7.3,-41,5.9,15.4,-41],
// 3 16 5.9 15.4 -41 5.9 19.1 -41 7.5 20 -41
  [3,16,5.9,15.4,-41,5.9,19.1,-41,7.5,20,-41],
// 4 16 -7.5 20 -41 7.5 20 -41 5.9 19.1 -41 -5.9 19.1 -41
  [4,16,-7.5,20,-41,7.5,20,-41,5.9,19.1,-41,-5.9,19.1,-41],
// 4 16 -7.5 20 -41 -5.9 19.1 -41 -5.9 15.4 -41 -7.5 5.5 -41
  [4,16,-7.5,20,-41,-5.9,19.1,-41,-5.9,15.4,-41,-7.5,5.5,-41],
// 3 16 -7.5 5.5 -41 -5.9 15.4 -41 -5.9 7.3 -41
  [3,16,-7.5,5.5,-41,-5.9,15.4,-41,-5.9,7.3,-41],
// 3 16 7.5 5.5 -41 2.1 7.3 -41 5.9 7.3 -41
  [3,16,7.5,5.5,-41,2.1,7.3,-41,5.9,7.3,-41],
// 3 16 7.5 5.5 -41 -2.1 7.3 -41 2.1 7.3 -41
  [3,16,7.5,5.5,-41,-2.1,7.3,-41,2.1,7.3,-41],
];
module ldraw_lib__20308p03(step=0, col=false, unit=2/5, alt=false, line=0.2, solid=!$preview)
    makepoly(ldraw_lib__20308p03(solid), step=step, col=col, unit=unit, alt=alt, line=line, solid=solid);
ldraw_lib__20308p03(line=0.2);
